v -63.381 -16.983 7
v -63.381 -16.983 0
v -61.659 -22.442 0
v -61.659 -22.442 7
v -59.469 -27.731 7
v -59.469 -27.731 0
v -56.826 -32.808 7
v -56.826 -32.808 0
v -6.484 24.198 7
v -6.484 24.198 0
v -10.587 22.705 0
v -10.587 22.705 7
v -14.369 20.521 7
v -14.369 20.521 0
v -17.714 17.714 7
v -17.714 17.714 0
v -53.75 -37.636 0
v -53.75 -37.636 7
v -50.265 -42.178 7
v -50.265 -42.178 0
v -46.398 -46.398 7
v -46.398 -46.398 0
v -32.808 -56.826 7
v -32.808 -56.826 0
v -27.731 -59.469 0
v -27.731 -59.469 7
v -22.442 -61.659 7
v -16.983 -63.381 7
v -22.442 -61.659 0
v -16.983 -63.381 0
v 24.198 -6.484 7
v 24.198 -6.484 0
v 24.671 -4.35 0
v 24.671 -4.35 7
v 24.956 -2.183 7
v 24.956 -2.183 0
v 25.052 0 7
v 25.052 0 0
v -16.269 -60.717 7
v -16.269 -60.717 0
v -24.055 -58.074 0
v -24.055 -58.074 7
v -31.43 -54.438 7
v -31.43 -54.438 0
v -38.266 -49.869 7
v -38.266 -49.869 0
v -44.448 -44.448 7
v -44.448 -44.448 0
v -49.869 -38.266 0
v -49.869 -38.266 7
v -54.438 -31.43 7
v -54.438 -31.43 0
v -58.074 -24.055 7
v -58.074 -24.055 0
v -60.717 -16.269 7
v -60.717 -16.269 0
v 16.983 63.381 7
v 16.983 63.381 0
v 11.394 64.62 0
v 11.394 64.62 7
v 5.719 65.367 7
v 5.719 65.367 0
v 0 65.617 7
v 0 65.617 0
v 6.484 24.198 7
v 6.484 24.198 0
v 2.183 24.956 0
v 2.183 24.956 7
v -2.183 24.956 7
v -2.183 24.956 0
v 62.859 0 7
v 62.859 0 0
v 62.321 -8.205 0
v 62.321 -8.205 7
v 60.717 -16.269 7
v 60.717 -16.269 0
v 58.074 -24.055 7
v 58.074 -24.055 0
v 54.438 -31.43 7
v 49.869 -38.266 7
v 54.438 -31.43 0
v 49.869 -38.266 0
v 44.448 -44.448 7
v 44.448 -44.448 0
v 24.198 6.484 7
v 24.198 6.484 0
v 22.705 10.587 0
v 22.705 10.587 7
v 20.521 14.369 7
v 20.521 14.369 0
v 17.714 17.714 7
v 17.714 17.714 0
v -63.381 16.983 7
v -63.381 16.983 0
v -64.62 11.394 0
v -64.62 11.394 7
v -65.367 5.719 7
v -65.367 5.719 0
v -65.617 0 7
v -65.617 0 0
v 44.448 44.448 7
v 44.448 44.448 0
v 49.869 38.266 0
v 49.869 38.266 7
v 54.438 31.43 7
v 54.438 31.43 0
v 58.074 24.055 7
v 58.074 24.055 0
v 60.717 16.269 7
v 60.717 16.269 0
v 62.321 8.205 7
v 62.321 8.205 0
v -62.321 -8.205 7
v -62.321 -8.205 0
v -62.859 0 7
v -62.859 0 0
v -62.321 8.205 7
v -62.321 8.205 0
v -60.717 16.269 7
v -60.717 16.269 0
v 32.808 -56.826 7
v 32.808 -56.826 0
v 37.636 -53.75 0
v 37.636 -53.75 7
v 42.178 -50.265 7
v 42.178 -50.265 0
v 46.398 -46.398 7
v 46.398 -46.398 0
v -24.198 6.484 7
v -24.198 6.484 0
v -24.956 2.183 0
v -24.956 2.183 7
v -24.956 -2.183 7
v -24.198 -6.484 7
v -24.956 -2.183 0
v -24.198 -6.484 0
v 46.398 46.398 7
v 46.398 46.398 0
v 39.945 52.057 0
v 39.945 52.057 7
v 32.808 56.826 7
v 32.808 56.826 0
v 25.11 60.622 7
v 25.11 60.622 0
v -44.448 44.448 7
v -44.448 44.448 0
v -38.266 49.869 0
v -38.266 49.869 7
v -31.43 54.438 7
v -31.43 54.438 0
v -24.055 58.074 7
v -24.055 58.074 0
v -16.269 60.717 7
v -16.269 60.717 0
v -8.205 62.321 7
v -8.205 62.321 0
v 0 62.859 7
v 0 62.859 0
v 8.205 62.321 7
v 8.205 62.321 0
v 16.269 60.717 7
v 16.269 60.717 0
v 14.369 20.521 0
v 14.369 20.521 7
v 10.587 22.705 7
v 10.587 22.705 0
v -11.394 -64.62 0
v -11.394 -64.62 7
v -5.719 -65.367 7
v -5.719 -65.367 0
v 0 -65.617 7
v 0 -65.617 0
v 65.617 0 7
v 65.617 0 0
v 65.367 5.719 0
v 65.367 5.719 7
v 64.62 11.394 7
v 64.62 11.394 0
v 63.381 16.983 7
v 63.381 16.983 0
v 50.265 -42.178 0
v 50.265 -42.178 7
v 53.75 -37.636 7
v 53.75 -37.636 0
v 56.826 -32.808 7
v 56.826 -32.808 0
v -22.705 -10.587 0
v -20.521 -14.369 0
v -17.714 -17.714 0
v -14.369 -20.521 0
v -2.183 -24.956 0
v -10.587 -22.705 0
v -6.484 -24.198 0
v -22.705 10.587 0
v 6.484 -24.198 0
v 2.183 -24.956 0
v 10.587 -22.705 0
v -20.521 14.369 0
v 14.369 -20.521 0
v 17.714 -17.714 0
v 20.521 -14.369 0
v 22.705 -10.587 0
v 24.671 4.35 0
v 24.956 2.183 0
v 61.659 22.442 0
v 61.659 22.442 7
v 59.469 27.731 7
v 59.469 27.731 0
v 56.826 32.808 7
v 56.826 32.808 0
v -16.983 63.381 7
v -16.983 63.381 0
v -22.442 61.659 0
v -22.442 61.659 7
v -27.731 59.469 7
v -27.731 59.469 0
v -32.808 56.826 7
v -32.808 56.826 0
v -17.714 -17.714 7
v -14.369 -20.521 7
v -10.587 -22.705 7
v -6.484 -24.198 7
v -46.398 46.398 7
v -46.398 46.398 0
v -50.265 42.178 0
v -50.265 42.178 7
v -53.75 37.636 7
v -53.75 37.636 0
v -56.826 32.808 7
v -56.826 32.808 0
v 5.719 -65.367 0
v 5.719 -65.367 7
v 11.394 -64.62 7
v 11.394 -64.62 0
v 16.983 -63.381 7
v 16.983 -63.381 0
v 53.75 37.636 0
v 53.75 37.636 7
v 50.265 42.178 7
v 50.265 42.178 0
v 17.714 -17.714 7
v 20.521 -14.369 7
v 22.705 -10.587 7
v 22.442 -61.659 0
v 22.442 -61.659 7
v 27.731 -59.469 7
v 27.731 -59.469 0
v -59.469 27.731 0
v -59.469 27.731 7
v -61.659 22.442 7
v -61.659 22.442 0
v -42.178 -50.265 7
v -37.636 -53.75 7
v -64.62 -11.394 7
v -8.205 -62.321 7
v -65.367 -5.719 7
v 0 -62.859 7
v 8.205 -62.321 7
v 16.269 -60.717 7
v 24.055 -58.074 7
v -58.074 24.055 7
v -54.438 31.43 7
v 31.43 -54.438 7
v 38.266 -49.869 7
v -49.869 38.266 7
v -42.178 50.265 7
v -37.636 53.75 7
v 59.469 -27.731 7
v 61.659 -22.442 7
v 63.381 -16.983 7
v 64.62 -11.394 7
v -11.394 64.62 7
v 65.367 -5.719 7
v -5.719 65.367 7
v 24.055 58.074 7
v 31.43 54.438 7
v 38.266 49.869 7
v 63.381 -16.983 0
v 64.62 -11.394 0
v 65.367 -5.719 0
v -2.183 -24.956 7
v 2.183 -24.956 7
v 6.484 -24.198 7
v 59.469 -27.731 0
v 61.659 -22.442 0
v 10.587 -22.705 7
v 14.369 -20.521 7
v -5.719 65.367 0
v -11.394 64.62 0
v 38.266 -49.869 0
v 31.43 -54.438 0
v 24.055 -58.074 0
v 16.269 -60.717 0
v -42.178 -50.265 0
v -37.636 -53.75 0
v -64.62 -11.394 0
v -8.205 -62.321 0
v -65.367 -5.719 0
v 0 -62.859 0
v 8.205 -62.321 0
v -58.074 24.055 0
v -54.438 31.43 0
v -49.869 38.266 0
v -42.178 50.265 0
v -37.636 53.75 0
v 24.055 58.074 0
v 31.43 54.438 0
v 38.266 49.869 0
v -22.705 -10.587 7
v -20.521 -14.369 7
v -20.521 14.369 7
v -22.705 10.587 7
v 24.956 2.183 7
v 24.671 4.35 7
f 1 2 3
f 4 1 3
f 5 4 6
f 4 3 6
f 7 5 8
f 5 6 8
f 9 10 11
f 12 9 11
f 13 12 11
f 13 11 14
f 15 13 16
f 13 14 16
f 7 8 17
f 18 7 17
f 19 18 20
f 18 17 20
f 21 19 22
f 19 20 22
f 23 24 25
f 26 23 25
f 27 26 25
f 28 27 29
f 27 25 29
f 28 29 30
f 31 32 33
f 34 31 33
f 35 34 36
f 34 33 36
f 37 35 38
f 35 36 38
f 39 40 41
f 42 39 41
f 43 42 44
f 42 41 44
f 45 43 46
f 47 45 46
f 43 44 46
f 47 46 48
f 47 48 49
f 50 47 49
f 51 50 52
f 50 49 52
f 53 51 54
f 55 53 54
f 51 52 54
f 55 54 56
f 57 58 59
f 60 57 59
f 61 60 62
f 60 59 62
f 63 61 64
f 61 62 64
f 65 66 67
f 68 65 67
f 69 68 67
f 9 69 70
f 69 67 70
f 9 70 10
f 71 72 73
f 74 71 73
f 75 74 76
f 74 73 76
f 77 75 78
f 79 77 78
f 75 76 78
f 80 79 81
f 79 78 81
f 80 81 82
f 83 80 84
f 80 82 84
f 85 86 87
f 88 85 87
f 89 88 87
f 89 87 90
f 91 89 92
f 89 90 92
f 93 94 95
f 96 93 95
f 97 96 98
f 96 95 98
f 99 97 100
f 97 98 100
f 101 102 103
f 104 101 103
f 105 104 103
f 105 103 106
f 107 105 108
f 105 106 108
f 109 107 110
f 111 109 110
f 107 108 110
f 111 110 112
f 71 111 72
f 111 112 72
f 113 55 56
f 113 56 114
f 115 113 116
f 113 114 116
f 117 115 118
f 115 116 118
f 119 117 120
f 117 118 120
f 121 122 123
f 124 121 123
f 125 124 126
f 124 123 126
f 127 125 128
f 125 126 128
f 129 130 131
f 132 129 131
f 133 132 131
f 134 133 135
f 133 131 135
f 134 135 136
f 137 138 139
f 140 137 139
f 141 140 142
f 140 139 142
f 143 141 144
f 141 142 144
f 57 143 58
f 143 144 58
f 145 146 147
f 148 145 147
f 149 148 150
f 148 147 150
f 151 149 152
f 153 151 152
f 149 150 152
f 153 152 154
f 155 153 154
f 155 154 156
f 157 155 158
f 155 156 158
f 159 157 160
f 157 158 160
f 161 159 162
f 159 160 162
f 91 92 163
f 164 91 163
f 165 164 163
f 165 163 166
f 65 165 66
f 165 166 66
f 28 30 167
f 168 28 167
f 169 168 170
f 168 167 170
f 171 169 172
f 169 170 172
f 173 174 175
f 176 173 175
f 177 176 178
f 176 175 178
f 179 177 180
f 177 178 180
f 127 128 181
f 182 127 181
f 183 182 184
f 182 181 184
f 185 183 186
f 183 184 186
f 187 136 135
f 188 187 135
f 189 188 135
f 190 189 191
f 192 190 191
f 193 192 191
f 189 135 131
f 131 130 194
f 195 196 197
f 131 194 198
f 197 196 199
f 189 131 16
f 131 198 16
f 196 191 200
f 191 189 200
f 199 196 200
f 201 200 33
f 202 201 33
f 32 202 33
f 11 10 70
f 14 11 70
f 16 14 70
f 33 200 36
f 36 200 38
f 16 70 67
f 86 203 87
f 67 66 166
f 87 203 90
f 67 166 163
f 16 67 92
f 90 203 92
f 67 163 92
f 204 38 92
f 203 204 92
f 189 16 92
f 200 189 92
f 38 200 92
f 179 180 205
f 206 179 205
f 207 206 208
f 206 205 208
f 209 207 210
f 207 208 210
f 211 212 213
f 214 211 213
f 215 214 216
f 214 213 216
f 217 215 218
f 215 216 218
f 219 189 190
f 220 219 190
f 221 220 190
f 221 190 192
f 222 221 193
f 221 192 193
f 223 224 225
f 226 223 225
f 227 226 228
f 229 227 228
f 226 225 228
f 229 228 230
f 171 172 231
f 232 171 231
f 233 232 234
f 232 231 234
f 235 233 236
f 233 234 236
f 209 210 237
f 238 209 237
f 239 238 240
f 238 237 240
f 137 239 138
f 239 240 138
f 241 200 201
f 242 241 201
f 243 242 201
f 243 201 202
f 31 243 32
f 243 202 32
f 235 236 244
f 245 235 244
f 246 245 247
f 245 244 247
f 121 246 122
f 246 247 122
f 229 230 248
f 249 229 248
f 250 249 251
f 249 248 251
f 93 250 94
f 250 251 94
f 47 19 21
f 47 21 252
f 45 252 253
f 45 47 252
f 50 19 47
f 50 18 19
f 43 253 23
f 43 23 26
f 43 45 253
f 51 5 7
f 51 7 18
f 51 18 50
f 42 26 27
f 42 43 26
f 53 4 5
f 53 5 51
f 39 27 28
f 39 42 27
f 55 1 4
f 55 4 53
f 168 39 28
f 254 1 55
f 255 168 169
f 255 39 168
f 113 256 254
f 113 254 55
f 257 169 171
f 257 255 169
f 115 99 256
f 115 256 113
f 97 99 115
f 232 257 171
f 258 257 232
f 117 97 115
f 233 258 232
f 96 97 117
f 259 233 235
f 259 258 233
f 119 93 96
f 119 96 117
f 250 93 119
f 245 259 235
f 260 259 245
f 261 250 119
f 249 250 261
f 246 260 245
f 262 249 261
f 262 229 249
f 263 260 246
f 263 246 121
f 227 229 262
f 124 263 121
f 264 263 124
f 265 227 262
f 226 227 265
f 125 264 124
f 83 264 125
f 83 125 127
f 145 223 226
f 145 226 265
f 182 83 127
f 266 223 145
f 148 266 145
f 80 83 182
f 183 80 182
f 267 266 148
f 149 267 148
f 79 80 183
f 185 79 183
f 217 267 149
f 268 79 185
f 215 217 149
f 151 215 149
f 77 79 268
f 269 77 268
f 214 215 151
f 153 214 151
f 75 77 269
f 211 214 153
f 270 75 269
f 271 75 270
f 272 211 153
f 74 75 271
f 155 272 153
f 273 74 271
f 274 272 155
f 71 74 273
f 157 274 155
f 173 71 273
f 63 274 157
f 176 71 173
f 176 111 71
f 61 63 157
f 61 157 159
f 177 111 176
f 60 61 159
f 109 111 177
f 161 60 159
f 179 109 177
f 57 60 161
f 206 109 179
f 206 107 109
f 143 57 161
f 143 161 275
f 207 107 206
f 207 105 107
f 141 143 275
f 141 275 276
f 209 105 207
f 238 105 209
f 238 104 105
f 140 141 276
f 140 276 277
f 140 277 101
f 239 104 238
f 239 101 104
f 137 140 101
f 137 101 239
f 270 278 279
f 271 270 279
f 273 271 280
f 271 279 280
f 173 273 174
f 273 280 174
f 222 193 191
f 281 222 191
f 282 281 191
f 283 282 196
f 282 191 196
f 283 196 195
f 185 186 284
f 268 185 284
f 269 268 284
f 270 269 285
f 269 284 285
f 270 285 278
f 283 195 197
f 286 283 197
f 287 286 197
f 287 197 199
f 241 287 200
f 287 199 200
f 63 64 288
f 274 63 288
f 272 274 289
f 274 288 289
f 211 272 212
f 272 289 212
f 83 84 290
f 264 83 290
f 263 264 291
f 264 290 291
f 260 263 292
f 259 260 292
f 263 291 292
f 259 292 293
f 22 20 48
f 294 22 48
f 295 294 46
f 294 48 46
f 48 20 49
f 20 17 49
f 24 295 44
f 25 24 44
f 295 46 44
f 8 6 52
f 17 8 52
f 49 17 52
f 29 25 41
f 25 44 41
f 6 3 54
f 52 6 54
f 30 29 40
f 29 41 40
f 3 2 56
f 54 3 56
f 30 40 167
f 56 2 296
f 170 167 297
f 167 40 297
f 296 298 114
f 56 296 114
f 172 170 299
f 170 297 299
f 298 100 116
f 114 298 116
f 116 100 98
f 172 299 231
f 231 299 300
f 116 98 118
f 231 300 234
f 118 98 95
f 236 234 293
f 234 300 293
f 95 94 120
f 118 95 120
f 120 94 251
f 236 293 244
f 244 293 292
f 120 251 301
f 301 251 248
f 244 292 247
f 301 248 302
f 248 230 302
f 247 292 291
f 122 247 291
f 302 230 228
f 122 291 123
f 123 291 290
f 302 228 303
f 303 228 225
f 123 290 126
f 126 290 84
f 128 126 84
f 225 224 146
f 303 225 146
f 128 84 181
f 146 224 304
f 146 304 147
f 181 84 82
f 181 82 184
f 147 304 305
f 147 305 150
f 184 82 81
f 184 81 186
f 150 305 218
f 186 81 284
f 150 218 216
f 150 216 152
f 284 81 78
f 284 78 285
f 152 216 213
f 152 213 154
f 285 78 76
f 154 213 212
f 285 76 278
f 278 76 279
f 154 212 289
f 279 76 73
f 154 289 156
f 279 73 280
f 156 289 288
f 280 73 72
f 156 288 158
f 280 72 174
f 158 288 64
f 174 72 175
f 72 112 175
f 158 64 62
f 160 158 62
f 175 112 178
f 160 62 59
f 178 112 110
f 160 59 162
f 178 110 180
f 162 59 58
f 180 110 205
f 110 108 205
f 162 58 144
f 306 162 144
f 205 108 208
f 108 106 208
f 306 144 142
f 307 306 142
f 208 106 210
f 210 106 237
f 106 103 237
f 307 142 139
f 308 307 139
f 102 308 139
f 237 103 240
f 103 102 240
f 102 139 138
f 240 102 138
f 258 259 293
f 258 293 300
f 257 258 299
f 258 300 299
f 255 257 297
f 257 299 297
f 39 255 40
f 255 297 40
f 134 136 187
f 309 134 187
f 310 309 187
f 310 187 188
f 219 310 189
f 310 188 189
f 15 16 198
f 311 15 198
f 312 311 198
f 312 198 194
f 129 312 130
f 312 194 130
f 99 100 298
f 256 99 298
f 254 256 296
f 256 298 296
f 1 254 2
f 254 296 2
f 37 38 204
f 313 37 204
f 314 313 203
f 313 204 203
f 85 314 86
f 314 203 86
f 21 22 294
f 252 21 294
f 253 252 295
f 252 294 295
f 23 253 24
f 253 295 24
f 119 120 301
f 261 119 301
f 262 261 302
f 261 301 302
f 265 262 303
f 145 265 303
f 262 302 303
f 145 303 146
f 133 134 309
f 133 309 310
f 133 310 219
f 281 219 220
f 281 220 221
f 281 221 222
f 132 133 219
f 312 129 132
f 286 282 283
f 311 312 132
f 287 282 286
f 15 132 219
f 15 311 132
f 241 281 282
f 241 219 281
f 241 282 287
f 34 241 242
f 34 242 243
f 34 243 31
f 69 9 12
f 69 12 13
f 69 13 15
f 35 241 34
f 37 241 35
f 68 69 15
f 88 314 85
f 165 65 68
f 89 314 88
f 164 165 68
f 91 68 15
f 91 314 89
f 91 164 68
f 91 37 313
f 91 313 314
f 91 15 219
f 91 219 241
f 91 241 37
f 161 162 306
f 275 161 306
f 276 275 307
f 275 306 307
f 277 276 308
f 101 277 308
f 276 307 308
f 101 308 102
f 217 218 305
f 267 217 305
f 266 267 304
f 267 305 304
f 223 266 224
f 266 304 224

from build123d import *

# Parameters (mm, degrees)
F1_DEPTH = 7


# Not quite as in the source:
# - the program builds the solid bodies; features that only make, move or delete a surface that nothing else refers to are left out


with BuildPart() as f1:
    # F0 (on Top) → F1 (new body)
    with BuildSketch(Plane.XY):
        with BuildLine():
            ThreePointArc((-60.7171979996, 16.2691241707), (-54.4375504652, 31.4295344151), (-44.4480738289, 44.4480738289))
            Line((-44.4480738289, 44.4480738289), (-46.3979145079, 46.3979145079))
            ThreePointArc((-46.3979145079, 46.3979145079), (-52.0571169794, 39.9448308691), (-56.8256077619, 32.8082801112))
            ThreePointArc((-56.8256077619, 32.8082801112), (-60.6217967148, 25.1103704558), (-63.3807299004, 16.9828153925))
            Line((-63.3807299004, 16.9828153925), (-60.7171979996, 16.2691241707))
        make_face()
        with BuildLine():
            ThreePointArc((-44.4480738289, 44.4480738289), (-31.4295344151, 54.4375504652), (-16.2691241707, 60.7171979996))
            Line((-16.2691241707, 60.7171979996), (-16.9828153925, 63.3807299004))
            ThreePointArc((-16.9828153925, 63.3807299004), (-25.110369915, 60.6217969388), (-32.8082790973, 56.8256083472))
            ThreePointArc((-32.8082790973, 56.8256083472), (-39.9448304047, 52.0571173357), (-46.3979145079, 46.3979145079))
            Line((-46.3979145079, 46.3979145079), (-44.4480738289, 44.4480738289))
        make_face()
        with BuildLine():
            ThreePointArc((-16.2691241707, 60.7171979996), (0, 62.8590688303), (16.2691241707, 60.7171979996))
            Line((16.2691241707, 60.7171979996), (16.9828153925, 63.3807299004))
            ThreePointArc((16.9828153925, 63.3807299004), (8.5646797863, 65.0552011873), (1.367e-07, 65.6165599629))
            ThreePointArc((1.367e-07, 65.6165599629), (-8.5646796508, 65.0552012051), (-16.9828153925, 63.3807299004))
            Line((-16.9828153925, 63.3807299004), (-16.2691241707, 60.7171979996))
        make_face()
        with BuildLine():
            Line((44.4480738289, 44.4480738289), (46.3979145079, 46.3979145079))
            ThreePointArc((46.3979145079, 46.3979145079), (39.9448310464, 52.0571168432), (32.8082804984, 56.8256075383))
            ThreePointArc((32.8082804984, 56.8256075383), (25.1103706624, 60.6217966293), (16.9828153925, 63.3807299004))
            Line((16.9828153925, 63.3807299004), (16.2691241707, 60.7171979996))
            ThreePointArc((16.2691241707, 60.7171979996), (31.4295344151, 54.4375504652), (44.4480738289, 44.4480738289))
        make_face()
        with BuildLine():
            Line((-63.3807299004, -16.9828153925), (-60.7171979996, -16.2691241707))
            ThreePointArc((-60.7171979996, -16.2691241707), (-62.8590688303, 0), (-60.7171979996, 16.2691241707))
            Line((-60.7171979996, 16.2691241707), (-63.3807299004, 16.9828153925))
            ThreePointArc((-63.3807299004, 16.9828153925), (-65.0552011962, 8.5646797185), (-65.6165599629, 0))
            ThreePointArc((-65.6165599629, 0), (-65.0552011962, -8.5646797185), (-63.3807299004, -16.9828153925))
        make_face()
        with BuildLine():
            Line((-46.3979145079, -46.3979145079), (-44.4480738289, -44.4480738289))
            ThreePointArc((-44.4480738289, -44.4480738289), (-54.4375504652, -31.4295344151), (-60.7171979996, -16.2691241707))
            Line((-60.7171979996, -16.2691241707), (-63.3807299004, -16.9828153925))
            ThreePointArc((-63.3807299004, -16.9828153925), (-60.6217966456, -25.1103706229), (-56.825607581, -32.8082804245))
            ThreePointArc((-56.825607581, -32.8082804245), (-52.0571168692, -39.9448310126), (-46.3979145079, -46.3979145079))
        make_face()
        with BuildLine():
            Line((-16.9828153925, -63.3807299004), (-16.2691241707, -60.7171979996))
            ThreePointArc((-16.2691241707, -60.7171979996), (-31.4295344151, -54.4375504652), (-44.4480738289, -44.4480738289))
            Line((-44.4480738289, -44.4480738289), (-46.3979145079, -46.3979145079))
            ThreePointArc((-46.3979145079, -46.3979145079), (-39.9448307804, -52.0571170474), (-32.8082799176, -56.8256078737))
            ThreePointArc((-32.8082799176, -56.8256078737), (-25.1103703525, -60.6217967576), (-16.9828153925, -63.3807299004))
        make_face()
        with BuildLine():
            Line((16.9828153925, -63.3807299004), (16.2691241707, -60.7171979996))
            ThreePointArc((16.2691241707, -60.7171979996), (0, -62.8590688303), (-16.2691241707, -60.7171979996))
            Line((-16.2691241707, -60.7171979996), (-16.9828153925, -63.3807299004))
            ThreePointArc((-16.9828153925, -63.3807299004), (-8.5646797185, -65.0552011962), (0, -65.6165599629))
            ThreePointArc((0, -65.6165599629), (8.5646797185, -65.0552011962), (16.9828153925, -63.3807299004))
        make_face()
        with BuildLine():
            ThreePointArc((32.8082803048, -56.8256076501), (39.9448309578, -52.0571169113), (46.3979145079, -46.3979145079))
            Line((46.3979145079, -46.3979145079), (44.4480738289, -44.4480738289))
            ThreePointArc((44.4480738289, -44.4480738289), (31.4295344151, -54.4375504652), (16.2691241707, -60.7171979996))
            Line((16.2691241707, -60.7171979996), (16.9828153925, -63.3807299004))
            ThreePointArc((16.9828153925, -63.3807299004), (25.1103705591, -60.621796672), (32.8082803048, -56.8256076501))
        make_face()
        with BuildLine():
            ThreePointArc((56.8256078737, -32.8082799176), (60.6217967576, -25.1103703525), (63.3807299004, -16.9828153925))
            Line((63.3807299004, -16.9828153925), (60.7171979996, -16.2691241707))
            ThreePointArc((60.7171979996, -16.2691241707), (54.4375504652, -31.4295344151), (44.4480738289, -44.4480738289))
            Line((44.4480738289, -44.4480738289), (46.3979145079, -46.3979145079))
            ThreePointArc((46.3979145079, -46.3979145079), (52.0571170474, -39.9448307804), (56.8256078737, -32.8082799176))
        make_face()
        with BuildLine():
            ThreePointArc((63.3807299004, -16.9828153925), (65.0552011962, -8.5646797185), (65.6165599629, 0))
            ThreePointArc((65.6165599629, 0), (65.0552011962, 8.5646797185), (63.3807299004, 16.9828153925))
            Line((63.3807299004, 16.9828153925), (60.7171979996, 16.2691241707))
            ThreePointArc((60.7171979996, 16.2691241707), (62.3213007825, 8.2047549009), (62.8590688303, 0))
            ThreePointArc((62.8590688303, 0), (62.3213007825, -8.2047549009), (60.7171979996, -16.2691241707))
            Line((60.7171979996, -16.2691241707), (63.3807299004, -16.9828153925))
        make_face()
        with BuildLine():
            Line((60.7171979996, 16.2691241707), (63.3807299004, 16.9828153925))
            ThreePointArc((63.3807299004, 16.9828153925), (60.6217966456, 25.1103706229), (56.825607581, 32.8082804245))
            ThreePointArc((56.825607581, 32.8082804245), (52.0571168692, 39.9448310126), (46.3979145079, 46.3979145079))
            Line((46.3979145079, 46.3979145079), (44.4480738289, 44.4480738289))
            ThreePointArc((44.4480738289, 44.4480738289), (54.4375504652, 31.4295344151), (60.7171979996, 16.2691241707))
        make_face()
    extrude(amount=F1_DEPTH)


with BuildPart() as f1b:
    # F0 (on Top) → F1, piece 2 (new body)
    with BuildSketch(Plane.XY):
        with BuildLine():
            Line((0, 0), (24.1980851045, 6.4838573621))
            ThreePointArc((24.1980851045, 6.4838573621), (21.6954095781, 12.5258505601), (17.7142277423, 17.7142277423))
            Line((17.7142277423, 17.7142277423), (0, 0))
        make_face()
        with BuildLine():
            Line((-6.4838573621, 24.1980851045), (0, 0))
            Line((0, 0), (6.4838573621, 24.1980851045))
            ThreePointArc((6.4838573621, 24.1980851045), (0, 25.0517011202), (-6.4838573621, 24.1980851045))
        make_face()
        with BuildLine():
            Line((-17.7142277423, -17.7142277423), (0, 0))
            Line((0, 0), (-24.1980851045, -6.4838573621))
            ThreePointArc((-24.1980851045, -6.4838573621), (-21.6954095781, -12.5258505601), (-17.7142277423, -17.7142277423))
        make_face()
        with BuildLine():
            Line((-6.4838573621, -24.1980851045), (0, 0))
            Line((0, 0), (-17.7142277423, -17.7142277423))
            ThreePointArc((-17.7142277423, -17.7142277423), (-12.5258505601, -21.6954095781), (-6.4838573621, -24.1980851045))
        make_face()
        with BuildLine():
            Line((6.4838573621, -24.1980851045), (0, 0))
            Line((0, 0), (-6.4838573621, -24.1980851045))
            ThreePointArc((-6.4838573621, -24.1980851045), (0, -25.0517011202), (6.4838573621, -24.1980851045))
        make_face()
        with BuildLine():
            Line((17.7142277423, -17.7142277423), (0, 0))
            Line((0, 0), (6.4838573621, -24.1980851045))
            ThreePointArc((6.4838573621, -24.1980851045), (12.5258505601, -21.6954095781), (17.7142277423, -17.7142277423))
        make_face()
        with BuildLine():
            ThreePointArc((17.7142277423, -17.7142277423), (21.6954095781, -12.5258505601), (24.1980851045, -6.4838573621))
            Line((24.1980851045, -6.4838573621), (0, 0))
            Line((0, 0), (17.7142277423, -17.7142277423))
        make_face()
        with BuildLine():
            ThreePointArc((25.0517011202, 0), (24.8373803443, 3.2699031559), (24.1980851045, 6.4838573621))
            Line((24.1980851045, 6.4838573621), (0, 0))
            Line((0, 0), (24.1980851045, -6.4838573621))
            ThreePointArc((24.1980851045, -6.4838573621), (24.8373803443, -3.2699031559), (25.0517011202, 0))
        make_face()
        with BuildLine():
            Line((-17.7142277423, 17.7142277423), (0, 0))
            Line((0, 0), (-6.4838573621, 24.1980851045))
            ThreePointArc((-6.4838573621, 24.1980851045), (-12.5258505601, 21.6954095781), (-17.7142277423, 17.7142277423))
        make_face()
        with BuildLine():
            Line((-24.1980851045, 6.4838573621), (0, 0))
            Line((0, 0), (-17.7142277423, 17.7142277423))
            ThreePointArc((-17.7142277423, 17.7142277423), (-21.6954095781, 12.5258505601), (-24.1980851045, 6.4838573621))
        make_face()
        with BuildLine():
            Line((-24.1980851045, -6.4838573621), (0, 0))
            Line((0, 0), (-24.1980851045, 6.4838573621))
            ThreePointArc((-24.1980851045, 6.4838573621), (-25.0517011202, 0), (-24.1980851045, -6.4838573621))
        make_face()
        with BuildLine():
            Line((0, 0), (17.7142277423, 17.7142277423))
            ThreePointArc((17.7142277423, 17.7142277423), (12.5258505601, 21.6954095781), (6.4838573621, 24.1980851045))
            Line((6.4838573621, 24.1980851045), (0, 0))
        make_face()
    extrude(amount=F1_DEPTH)


solid = Compound([f1.part, f1b.part])
